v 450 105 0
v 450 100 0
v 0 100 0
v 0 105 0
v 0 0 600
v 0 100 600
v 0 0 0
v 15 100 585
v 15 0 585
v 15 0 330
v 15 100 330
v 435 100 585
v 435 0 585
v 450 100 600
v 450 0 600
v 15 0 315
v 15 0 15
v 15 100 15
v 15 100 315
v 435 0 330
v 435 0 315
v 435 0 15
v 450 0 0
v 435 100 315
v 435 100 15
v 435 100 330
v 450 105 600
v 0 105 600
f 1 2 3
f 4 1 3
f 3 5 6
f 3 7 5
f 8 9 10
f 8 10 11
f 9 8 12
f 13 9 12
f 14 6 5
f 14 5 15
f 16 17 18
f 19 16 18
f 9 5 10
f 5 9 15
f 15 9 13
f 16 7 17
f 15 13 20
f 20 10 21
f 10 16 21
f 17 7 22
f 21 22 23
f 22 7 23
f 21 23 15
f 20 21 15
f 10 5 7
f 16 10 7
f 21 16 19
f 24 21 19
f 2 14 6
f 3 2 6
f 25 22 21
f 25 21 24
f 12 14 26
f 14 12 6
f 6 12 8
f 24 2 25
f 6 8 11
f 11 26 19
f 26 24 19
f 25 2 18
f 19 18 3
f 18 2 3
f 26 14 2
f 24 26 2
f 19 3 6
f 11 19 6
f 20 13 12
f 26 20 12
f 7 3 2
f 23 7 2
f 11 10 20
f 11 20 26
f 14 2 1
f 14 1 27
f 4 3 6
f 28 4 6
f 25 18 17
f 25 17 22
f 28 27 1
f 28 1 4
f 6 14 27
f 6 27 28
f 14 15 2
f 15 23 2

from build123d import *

# Parameters (mm, degrees)
F0_W     = 450
F0_H     = 100
F1_DEPTH = 15
F2_W     = 15
F2_H     = 100
F3_DEPTH = 570
F4_W     = 435
F4_H     = 100
F4_W_2   = 15
F5_DEPTH = 15
F6_W     = 100
F6_H     = 15
F7_DEPTH = 420
F8_W     = 450
F8_H     = 600
F8_W_2   = 420
F8_H_2   = 300
F8_H_3   = 255
F9_DEPTH = 5


with BuildPart() as f1:
    # F0 (on Top) → F1 (new body)
    with BuildSketch(Plane.XY):
        with Locations((225, 50)):
            Rectangle(F0_W, F0_H)
    extrude(amount=F1_DEPTH)

    # F2 (on face) → F3 (join)
    with BuildSketch(Plane.XY.offset(15)):
        with Locations((7.5, 50)):
            Rectangle(F2_W, F2_H)
        with Locations((442.5, 50)):
            Rectangle(F2_W, F2_H)
    extrude(amount=F3_DEPTH)

    # F4 (on face) → F5 (join)
    with BuildSketch(Plane.XY.offset(585)):
        with Locations((217.5, 50)):
            Rectangle(F4_W, F4_H)
        with Locations((442.5, 50)):
            Rectangle(F4_W_2, F4_H)
    extrude(amount=F5_DEPTH)

    # F6 (on face) → F7 (join, through all)
    with BuildSketch(Plane.YZ.offset(15)):
        with Locations((50, 322.5)):
            Rectangle(F6_W, F6_H)
    extrude(amount=F7_DEPTH)


with BuildPart() as f9:
    # F8 (on face) → F9 (new body)
    with BuildSketch(Plane(origin=(0, 100, 0), x_dir=(-1, 0, 0), z_dir=(0, 1, 0))):
        with Locations((-225, 300)):
            Rectangle(F8_W, F8_H)
        with Locations((-225, 165)):
            Rectangle(F8_W_2, F8_H_2, mode=Mode.SUBTRACT)
        with Locations((-225, 457.5)):
            Rectangle(F8_W_2, F8_H_3, mode=Mode.SUBTRACT)
        with Locations((-225, 457.5)):
            Rectangle(F8_W_2, F8_H_3)
        with Locations((-225, 165)):
            Rectangle(F8_W_2, F8_H_2)
    extrude(amount=F9_DEPTH)


solid = Compound([f1.part, f9.part])
